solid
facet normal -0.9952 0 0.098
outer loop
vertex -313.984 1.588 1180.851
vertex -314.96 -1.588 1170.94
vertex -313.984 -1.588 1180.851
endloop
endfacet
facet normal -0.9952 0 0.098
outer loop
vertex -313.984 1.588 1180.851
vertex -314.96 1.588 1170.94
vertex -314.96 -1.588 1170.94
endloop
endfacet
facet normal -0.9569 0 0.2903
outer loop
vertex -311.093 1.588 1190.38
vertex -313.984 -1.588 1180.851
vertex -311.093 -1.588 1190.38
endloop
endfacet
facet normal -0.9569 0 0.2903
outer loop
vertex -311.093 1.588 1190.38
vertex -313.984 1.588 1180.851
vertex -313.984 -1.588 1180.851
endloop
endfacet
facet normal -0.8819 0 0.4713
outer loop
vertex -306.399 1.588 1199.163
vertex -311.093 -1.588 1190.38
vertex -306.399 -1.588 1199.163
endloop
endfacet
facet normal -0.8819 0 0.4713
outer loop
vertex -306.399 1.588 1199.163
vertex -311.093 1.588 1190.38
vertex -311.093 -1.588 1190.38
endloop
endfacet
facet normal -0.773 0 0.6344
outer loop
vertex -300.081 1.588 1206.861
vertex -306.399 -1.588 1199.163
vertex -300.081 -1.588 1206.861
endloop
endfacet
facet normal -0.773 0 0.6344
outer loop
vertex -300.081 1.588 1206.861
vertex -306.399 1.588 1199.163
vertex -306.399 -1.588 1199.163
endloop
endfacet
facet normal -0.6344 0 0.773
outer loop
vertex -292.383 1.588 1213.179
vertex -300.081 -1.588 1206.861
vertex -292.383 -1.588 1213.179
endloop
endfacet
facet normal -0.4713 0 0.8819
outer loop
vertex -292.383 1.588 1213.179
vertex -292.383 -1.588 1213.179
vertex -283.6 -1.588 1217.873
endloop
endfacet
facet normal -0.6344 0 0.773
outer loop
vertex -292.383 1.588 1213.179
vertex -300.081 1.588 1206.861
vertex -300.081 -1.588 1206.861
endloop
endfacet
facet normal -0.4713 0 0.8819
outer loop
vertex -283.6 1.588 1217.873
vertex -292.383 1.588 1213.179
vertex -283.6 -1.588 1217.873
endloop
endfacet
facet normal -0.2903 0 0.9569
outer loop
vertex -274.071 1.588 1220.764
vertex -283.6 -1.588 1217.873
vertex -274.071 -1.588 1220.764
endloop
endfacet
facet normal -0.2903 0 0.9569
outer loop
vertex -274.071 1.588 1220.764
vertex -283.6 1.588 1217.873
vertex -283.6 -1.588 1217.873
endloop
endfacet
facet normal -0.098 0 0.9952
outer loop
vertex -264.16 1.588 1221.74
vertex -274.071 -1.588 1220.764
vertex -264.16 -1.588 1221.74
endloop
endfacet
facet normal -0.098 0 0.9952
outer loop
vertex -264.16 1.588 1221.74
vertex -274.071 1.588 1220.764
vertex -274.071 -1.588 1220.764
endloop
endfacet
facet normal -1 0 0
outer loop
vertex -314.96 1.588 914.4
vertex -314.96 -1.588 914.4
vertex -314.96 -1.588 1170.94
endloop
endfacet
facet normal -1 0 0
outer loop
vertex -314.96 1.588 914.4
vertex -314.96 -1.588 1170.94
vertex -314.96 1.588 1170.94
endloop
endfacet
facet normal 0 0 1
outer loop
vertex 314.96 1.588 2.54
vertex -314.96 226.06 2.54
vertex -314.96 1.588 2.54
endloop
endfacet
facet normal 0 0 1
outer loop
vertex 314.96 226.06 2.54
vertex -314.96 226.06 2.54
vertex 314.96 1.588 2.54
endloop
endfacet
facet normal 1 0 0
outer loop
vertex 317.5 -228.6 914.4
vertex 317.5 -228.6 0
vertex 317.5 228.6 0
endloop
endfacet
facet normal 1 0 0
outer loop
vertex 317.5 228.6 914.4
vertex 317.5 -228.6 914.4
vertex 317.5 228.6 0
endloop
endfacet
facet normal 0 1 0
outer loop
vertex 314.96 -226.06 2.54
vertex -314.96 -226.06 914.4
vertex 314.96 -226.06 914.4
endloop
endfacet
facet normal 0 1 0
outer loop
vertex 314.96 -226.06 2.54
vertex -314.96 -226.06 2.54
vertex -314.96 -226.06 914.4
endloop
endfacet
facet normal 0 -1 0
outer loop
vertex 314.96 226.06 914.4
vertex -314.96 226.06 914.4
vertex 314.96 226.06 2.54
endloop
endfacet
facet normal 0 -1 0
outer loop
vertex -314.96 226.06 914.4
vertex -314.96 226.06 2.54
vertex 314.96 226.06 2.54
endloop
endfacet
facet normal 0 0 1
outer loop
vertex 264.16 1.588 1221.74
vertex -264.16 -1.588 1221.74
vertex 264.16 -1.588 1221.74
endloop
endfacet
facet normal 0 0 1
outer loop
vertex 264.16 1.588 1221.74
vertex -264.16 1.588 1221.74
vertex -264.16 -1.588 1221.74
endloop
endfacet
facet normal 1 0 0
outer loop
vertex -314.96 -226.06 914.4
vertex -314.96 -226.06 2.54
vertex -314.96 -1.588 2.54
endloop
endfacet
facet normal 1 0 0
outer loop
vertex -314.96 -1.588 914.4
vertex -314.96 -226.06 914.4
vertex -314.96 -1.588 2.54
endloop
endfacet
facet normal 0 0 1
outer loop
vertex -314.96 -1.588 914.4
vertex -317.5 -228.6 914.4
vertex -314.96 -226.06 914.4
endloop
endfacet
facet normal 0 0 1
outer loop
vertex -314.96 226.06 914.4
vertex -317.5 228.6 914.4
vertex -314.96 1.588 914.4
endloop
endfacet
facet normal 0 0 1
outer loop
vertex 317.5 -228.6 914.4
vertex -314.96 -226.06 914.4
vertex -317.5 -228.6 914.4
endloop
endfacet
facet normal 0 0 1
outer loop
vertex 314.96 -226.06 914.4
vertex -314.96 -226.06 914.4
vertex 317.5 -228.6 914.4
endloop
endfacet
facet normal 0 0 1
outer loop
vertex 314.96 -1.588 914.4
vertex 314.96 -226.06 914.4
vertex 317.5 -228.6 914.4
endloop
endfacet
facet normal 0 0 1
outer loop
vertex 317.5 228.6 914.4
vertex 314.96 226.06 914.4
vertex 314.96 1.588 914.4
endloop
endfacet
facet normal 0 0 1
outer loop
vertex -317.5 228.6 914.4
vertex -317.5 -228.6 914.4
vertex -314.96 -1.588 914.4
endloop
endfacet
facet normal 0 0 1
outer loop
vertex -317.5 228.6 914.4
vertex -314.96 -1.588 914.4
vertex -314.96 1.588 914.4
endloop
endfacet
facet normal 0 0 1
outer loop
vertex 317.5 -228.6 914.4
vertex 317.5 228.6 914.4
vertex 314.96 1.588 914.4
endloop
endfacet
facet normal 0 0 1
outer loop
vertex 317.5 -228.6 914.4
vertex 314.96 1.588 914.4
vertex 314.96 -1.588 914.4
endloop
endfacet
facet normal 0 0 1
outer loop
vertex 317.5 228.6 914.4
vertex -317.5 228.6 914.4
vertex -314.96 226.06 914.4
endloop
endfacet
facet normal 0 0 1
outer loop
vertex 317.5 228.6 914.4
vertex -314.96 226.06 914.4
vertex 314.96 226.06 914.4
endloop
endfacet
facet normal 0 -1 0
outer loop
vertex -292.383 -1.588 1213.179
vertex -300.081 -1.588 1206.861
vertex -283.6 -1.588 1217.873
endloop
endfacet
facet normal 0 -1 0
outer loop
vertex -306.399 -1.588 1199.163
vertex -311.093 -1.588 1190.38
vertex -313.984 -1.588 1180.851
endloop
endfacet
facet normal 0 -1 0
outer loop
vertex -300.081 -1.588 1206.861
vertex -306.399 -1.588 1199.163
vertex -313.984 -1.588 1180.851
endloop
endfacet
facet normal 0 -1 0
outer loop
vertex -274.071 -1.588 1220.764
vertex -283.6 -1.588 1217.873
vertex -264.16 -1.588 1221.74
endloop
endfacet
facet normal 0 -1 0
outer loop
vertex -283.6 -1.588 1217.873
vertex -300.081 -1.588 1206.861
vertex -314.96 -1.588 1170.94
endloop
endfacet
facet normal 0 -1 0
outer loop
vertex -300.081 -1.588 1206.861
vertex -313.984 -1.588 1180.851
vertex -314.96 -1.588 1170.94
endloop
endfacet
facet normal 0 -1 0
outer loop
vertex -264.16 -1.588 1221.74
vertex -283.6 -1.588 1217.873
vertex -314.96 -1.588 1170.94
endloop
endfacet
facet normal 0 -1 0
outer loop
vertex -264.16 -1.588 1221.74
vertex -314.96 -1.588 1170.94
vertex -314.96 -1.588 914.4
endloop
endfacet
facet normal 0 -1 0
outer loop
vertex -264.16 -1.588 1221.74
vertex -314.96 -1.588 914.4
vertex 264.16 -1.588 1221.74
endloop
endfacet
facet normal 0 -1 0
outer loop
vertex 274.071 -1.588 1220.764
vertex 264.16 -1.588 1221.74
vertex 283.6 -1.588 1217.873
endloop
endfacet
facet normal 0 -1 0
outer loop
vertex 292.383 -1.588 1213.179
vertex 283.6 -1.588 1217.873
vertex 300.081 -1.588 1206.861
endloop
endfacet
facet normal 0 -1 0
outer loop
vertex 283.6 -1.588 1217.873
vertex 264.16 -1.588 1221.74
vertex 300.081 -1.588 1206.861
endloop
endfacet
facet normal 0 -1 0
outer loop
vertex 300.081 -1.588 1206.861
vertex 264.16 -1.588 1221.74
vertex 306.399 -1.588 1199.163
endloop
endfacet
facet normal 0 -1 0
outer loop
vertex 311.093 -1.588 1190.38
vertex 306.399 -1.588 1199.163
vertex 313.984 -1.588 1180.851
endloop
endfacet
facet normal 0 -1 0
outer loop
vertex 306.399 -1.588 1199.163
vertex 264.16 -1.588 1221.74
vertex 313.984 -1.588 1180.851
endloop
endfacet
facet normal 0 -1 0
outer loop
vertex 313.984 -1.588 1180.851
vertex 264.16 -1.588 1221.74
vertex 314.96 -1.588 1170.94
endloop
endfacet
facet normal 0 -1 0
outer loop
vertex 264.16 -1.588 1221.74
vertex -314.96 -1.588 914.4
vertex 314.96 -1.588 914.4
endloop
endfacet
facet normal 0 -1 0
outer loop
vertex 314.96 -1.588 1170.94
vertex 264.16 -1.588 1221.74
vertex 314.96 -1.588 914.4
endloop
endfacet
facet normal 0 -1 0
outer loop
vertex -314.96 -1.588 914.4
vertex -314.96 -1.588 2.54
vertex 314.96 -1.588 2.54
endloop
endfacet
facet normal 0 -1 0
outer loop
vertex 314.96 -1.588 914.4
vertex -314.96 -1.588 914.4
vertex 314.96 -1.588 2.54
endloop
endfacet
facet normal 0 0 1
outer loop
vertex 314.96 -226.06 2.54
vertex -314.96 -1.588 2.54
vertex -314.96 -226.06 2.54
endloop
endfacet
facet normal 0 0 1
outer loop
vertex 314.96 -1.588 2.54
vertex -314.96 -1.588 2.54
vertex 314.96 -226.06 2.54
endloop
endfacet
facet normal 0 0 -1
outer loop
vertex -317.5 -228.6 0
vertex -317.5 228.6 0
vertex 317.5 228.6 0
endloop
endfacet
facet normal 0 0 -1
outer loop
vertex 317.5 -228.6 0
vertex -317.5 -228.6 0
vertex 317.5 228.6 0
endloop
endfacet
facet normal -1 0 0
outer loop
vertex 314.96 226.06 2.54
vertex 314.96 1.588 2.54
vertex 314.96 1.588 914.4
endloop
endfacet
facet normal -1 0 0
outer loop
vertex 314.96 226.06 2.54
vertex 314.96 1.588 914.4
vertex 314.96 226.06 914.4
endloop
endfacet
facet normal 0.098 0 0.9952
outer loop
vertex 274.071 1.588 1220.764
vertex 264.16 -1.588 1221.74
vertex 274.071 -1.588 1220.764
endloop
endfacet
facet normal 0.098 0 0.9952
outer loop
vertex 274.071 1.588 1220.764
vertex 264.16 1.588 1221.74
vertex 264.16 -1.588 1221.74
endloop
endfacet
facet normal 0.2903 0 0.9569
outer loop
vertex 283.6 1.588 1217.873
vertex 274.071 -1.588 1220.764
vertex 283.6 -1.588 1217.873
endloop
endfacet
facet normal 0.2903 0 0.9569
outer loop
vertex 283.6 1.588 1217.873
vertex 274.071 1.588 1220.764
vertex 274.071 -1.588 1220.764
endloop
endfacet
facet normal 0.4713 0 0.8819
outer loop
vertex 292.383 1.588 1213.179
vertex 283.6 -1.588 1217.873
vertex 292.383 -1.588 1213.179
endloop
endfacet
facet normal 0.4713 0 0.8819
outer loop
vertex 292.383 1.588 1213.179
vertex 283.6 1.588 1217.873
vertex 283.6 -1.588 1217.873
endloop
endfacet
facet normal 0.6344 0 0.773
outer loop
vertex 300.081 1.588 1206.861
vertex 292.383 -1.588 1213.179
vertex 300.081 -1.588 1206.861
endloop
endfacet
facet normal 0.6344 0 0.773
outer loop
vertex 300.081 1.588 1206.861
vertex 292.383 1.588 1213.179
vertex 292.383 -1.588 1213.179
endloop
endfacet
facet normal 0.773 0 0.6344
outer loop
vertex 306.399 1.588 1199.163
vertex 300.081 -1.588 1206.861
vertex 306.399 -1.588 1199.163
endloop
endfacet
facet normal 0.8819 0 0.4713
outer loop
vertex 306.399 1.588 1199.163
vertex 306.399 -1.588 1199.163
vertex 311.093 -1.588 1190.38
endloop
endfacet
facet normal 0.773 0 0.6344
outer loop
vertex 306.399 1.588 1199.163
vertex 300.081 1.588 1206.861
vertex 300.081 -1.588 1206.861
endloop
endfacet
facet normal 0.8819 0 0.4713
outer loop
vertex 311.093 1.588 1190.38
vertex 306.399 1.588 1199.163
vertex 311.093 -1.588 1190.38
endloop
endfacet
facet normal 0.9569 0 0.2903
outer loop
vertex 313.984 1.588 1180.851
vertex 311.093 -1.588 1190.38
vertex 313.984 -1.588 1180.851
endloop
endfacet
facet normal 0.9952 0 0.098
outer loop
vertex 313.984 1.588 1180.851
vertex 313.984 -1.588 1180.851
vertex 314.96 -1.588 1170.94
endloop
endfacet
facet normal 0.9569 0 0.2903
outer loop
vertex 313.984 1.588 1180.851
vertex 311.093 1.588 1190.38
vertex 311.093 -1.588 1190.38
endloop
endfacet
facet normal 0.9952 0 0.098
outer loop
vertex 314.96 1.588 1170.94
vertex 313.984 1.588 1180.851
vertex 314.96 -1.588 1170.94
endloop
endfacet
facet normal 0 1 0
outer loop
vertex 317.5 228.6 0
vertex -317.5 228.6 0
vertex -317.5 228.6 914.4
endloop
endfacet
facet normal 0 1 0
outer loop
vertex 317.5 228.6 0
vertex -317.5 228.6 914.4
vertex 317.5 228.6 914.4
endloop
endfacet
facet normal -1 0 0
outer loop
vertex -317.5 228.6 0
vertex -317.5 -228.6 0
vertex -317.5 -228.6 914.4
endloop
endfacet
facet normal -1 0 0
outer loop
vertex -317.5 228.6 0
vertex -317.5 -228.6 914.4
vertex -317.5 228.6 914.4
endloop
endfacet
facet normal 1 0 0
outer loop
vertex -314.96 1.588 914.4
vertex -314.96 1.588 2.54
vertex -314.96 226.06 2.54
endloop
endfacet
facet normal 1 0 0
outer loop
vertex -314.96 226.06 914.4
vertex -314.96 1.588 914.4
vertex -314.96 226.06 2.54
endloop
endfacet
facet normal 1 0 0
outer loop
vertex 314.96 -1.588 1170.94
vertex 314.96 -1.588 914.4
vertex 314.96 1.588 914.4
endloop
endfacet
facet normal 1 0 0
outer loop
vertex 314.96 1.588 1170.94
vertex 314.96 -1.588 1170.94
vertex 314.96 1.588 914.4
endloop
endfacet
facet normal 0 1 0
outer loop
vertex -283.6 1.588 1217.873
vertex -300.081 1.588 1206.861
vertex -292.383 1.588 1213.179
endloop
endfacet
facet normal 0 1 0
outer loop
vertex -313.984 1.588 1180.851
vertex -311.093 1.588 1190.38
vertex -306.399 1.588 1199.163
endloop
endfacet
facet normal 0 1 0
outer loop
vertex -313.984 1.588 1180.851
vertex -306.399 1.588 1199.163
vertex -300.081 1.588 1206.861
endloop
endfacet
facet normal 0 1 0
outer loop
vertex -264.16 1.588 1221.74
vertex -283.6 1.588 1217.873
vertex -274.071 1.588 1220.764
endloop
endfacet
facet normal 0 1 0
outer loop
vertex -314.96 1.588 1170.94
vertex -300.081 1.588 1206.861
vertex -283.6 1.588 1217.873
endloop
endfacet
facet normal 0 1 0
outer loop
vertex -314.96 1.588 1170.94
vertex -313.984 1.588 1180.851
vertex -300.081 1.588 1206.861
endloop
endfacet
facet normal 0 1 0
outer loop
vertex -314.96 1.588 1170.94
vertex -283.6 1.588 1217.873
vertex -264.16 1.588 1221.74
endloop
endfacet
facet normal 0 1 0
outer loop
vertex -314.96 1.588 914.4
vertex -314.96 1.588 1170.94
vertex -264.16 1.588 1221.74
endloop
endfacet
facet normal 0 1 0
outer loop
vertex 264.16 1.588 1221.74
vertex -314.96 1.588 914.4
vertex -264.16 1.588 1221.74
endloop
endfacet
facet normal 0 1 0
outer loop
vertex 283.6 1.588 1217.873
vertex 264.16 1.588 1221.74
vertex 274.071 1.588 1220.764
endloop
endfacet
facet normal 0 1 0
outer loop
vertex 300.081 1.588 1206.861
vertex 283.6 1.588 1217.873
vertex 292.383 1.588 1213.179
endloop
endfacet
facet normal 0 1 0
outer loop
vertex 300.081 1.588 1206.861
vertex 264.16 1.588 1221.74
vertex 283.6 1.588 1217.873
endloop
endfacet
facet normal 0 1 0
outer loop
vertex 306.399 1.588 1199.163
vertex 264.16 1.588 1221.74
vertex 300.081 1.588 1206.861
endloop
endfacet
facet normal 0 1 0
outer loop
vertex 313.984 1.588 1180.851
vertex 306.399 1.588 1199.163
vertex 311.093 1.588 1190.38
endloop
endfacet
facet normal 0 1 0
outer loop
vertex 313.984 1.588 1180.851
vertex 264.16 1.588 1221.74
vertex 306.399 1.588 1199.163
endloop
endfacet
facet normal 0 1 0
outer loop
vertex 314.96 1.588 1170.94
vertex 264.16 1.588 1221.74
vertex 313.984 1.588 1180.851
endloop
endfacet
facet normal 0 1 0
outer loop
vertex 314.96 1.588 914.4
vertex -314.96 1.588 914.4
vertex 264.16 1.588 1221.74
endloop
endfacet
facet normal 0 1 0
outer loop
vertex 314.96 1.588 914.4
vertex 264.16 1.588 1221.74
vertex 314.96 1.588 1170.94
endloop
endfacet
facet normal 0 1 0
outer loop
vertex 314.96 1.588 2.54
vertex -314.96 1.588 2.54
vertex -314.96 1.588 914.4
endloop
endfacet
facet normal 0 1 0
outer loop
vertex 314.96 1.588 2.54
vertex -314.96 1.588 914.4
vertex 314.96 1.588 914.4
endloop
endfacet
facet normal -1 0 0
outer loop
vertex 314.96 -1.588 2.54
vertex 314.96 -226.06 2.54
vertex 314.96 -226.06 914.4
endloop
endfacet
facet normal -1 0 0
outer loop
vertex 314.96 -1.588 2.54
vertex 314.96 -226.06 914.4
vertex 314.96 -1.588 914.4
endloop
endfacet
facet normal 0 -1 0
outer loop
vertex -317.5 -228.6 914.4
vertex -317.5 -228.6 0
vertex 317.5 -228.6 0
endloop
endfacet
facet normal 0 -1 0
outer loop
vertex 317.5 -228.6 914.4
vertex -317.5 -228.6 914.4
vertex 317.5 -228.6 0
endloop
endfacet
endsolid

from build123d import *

# Parameters (mm, degrees)
F0_W     = 635
F0_H     = 457.2
F1_DEPTH = 914.4
F2_T     = -2.54
F3_W     = 629.92
F3_H     = 3.175
F4_DEPTH = 1219.2
F5_R     = 50.8


with BuildPart() as f1:
    # F0 (on Top) → F1 (new body)
    with BuildSketch(Plane.XY):
        Rectangle(F0_W, F0_H)
    extrude(amount=F1_DEPTH)

    # F2
    f2_openings = [f1.faces().sort_by_distance(p)[0] for p in [
        (0, 0, 914.4),
    ]]
    offset(amount=F2_T, openings=f2_openings)

    # F3 (on face) → F4 (join)
    with BuildSketch(Plane.XY.offset(2.54)):
        Rectangle(F3_W, F3_H)
    extrude(amount=F4_DEPTH)

    # F5
    f5_edges = [f1.edges().sort_by_distance(p)[0] for p in [
        (314.96, 0, 1221.74),
        (-314.96, 0, 1221.74),
    ]]
    fillet(f5_edges, radius=F5_R)


solid = f1.part
